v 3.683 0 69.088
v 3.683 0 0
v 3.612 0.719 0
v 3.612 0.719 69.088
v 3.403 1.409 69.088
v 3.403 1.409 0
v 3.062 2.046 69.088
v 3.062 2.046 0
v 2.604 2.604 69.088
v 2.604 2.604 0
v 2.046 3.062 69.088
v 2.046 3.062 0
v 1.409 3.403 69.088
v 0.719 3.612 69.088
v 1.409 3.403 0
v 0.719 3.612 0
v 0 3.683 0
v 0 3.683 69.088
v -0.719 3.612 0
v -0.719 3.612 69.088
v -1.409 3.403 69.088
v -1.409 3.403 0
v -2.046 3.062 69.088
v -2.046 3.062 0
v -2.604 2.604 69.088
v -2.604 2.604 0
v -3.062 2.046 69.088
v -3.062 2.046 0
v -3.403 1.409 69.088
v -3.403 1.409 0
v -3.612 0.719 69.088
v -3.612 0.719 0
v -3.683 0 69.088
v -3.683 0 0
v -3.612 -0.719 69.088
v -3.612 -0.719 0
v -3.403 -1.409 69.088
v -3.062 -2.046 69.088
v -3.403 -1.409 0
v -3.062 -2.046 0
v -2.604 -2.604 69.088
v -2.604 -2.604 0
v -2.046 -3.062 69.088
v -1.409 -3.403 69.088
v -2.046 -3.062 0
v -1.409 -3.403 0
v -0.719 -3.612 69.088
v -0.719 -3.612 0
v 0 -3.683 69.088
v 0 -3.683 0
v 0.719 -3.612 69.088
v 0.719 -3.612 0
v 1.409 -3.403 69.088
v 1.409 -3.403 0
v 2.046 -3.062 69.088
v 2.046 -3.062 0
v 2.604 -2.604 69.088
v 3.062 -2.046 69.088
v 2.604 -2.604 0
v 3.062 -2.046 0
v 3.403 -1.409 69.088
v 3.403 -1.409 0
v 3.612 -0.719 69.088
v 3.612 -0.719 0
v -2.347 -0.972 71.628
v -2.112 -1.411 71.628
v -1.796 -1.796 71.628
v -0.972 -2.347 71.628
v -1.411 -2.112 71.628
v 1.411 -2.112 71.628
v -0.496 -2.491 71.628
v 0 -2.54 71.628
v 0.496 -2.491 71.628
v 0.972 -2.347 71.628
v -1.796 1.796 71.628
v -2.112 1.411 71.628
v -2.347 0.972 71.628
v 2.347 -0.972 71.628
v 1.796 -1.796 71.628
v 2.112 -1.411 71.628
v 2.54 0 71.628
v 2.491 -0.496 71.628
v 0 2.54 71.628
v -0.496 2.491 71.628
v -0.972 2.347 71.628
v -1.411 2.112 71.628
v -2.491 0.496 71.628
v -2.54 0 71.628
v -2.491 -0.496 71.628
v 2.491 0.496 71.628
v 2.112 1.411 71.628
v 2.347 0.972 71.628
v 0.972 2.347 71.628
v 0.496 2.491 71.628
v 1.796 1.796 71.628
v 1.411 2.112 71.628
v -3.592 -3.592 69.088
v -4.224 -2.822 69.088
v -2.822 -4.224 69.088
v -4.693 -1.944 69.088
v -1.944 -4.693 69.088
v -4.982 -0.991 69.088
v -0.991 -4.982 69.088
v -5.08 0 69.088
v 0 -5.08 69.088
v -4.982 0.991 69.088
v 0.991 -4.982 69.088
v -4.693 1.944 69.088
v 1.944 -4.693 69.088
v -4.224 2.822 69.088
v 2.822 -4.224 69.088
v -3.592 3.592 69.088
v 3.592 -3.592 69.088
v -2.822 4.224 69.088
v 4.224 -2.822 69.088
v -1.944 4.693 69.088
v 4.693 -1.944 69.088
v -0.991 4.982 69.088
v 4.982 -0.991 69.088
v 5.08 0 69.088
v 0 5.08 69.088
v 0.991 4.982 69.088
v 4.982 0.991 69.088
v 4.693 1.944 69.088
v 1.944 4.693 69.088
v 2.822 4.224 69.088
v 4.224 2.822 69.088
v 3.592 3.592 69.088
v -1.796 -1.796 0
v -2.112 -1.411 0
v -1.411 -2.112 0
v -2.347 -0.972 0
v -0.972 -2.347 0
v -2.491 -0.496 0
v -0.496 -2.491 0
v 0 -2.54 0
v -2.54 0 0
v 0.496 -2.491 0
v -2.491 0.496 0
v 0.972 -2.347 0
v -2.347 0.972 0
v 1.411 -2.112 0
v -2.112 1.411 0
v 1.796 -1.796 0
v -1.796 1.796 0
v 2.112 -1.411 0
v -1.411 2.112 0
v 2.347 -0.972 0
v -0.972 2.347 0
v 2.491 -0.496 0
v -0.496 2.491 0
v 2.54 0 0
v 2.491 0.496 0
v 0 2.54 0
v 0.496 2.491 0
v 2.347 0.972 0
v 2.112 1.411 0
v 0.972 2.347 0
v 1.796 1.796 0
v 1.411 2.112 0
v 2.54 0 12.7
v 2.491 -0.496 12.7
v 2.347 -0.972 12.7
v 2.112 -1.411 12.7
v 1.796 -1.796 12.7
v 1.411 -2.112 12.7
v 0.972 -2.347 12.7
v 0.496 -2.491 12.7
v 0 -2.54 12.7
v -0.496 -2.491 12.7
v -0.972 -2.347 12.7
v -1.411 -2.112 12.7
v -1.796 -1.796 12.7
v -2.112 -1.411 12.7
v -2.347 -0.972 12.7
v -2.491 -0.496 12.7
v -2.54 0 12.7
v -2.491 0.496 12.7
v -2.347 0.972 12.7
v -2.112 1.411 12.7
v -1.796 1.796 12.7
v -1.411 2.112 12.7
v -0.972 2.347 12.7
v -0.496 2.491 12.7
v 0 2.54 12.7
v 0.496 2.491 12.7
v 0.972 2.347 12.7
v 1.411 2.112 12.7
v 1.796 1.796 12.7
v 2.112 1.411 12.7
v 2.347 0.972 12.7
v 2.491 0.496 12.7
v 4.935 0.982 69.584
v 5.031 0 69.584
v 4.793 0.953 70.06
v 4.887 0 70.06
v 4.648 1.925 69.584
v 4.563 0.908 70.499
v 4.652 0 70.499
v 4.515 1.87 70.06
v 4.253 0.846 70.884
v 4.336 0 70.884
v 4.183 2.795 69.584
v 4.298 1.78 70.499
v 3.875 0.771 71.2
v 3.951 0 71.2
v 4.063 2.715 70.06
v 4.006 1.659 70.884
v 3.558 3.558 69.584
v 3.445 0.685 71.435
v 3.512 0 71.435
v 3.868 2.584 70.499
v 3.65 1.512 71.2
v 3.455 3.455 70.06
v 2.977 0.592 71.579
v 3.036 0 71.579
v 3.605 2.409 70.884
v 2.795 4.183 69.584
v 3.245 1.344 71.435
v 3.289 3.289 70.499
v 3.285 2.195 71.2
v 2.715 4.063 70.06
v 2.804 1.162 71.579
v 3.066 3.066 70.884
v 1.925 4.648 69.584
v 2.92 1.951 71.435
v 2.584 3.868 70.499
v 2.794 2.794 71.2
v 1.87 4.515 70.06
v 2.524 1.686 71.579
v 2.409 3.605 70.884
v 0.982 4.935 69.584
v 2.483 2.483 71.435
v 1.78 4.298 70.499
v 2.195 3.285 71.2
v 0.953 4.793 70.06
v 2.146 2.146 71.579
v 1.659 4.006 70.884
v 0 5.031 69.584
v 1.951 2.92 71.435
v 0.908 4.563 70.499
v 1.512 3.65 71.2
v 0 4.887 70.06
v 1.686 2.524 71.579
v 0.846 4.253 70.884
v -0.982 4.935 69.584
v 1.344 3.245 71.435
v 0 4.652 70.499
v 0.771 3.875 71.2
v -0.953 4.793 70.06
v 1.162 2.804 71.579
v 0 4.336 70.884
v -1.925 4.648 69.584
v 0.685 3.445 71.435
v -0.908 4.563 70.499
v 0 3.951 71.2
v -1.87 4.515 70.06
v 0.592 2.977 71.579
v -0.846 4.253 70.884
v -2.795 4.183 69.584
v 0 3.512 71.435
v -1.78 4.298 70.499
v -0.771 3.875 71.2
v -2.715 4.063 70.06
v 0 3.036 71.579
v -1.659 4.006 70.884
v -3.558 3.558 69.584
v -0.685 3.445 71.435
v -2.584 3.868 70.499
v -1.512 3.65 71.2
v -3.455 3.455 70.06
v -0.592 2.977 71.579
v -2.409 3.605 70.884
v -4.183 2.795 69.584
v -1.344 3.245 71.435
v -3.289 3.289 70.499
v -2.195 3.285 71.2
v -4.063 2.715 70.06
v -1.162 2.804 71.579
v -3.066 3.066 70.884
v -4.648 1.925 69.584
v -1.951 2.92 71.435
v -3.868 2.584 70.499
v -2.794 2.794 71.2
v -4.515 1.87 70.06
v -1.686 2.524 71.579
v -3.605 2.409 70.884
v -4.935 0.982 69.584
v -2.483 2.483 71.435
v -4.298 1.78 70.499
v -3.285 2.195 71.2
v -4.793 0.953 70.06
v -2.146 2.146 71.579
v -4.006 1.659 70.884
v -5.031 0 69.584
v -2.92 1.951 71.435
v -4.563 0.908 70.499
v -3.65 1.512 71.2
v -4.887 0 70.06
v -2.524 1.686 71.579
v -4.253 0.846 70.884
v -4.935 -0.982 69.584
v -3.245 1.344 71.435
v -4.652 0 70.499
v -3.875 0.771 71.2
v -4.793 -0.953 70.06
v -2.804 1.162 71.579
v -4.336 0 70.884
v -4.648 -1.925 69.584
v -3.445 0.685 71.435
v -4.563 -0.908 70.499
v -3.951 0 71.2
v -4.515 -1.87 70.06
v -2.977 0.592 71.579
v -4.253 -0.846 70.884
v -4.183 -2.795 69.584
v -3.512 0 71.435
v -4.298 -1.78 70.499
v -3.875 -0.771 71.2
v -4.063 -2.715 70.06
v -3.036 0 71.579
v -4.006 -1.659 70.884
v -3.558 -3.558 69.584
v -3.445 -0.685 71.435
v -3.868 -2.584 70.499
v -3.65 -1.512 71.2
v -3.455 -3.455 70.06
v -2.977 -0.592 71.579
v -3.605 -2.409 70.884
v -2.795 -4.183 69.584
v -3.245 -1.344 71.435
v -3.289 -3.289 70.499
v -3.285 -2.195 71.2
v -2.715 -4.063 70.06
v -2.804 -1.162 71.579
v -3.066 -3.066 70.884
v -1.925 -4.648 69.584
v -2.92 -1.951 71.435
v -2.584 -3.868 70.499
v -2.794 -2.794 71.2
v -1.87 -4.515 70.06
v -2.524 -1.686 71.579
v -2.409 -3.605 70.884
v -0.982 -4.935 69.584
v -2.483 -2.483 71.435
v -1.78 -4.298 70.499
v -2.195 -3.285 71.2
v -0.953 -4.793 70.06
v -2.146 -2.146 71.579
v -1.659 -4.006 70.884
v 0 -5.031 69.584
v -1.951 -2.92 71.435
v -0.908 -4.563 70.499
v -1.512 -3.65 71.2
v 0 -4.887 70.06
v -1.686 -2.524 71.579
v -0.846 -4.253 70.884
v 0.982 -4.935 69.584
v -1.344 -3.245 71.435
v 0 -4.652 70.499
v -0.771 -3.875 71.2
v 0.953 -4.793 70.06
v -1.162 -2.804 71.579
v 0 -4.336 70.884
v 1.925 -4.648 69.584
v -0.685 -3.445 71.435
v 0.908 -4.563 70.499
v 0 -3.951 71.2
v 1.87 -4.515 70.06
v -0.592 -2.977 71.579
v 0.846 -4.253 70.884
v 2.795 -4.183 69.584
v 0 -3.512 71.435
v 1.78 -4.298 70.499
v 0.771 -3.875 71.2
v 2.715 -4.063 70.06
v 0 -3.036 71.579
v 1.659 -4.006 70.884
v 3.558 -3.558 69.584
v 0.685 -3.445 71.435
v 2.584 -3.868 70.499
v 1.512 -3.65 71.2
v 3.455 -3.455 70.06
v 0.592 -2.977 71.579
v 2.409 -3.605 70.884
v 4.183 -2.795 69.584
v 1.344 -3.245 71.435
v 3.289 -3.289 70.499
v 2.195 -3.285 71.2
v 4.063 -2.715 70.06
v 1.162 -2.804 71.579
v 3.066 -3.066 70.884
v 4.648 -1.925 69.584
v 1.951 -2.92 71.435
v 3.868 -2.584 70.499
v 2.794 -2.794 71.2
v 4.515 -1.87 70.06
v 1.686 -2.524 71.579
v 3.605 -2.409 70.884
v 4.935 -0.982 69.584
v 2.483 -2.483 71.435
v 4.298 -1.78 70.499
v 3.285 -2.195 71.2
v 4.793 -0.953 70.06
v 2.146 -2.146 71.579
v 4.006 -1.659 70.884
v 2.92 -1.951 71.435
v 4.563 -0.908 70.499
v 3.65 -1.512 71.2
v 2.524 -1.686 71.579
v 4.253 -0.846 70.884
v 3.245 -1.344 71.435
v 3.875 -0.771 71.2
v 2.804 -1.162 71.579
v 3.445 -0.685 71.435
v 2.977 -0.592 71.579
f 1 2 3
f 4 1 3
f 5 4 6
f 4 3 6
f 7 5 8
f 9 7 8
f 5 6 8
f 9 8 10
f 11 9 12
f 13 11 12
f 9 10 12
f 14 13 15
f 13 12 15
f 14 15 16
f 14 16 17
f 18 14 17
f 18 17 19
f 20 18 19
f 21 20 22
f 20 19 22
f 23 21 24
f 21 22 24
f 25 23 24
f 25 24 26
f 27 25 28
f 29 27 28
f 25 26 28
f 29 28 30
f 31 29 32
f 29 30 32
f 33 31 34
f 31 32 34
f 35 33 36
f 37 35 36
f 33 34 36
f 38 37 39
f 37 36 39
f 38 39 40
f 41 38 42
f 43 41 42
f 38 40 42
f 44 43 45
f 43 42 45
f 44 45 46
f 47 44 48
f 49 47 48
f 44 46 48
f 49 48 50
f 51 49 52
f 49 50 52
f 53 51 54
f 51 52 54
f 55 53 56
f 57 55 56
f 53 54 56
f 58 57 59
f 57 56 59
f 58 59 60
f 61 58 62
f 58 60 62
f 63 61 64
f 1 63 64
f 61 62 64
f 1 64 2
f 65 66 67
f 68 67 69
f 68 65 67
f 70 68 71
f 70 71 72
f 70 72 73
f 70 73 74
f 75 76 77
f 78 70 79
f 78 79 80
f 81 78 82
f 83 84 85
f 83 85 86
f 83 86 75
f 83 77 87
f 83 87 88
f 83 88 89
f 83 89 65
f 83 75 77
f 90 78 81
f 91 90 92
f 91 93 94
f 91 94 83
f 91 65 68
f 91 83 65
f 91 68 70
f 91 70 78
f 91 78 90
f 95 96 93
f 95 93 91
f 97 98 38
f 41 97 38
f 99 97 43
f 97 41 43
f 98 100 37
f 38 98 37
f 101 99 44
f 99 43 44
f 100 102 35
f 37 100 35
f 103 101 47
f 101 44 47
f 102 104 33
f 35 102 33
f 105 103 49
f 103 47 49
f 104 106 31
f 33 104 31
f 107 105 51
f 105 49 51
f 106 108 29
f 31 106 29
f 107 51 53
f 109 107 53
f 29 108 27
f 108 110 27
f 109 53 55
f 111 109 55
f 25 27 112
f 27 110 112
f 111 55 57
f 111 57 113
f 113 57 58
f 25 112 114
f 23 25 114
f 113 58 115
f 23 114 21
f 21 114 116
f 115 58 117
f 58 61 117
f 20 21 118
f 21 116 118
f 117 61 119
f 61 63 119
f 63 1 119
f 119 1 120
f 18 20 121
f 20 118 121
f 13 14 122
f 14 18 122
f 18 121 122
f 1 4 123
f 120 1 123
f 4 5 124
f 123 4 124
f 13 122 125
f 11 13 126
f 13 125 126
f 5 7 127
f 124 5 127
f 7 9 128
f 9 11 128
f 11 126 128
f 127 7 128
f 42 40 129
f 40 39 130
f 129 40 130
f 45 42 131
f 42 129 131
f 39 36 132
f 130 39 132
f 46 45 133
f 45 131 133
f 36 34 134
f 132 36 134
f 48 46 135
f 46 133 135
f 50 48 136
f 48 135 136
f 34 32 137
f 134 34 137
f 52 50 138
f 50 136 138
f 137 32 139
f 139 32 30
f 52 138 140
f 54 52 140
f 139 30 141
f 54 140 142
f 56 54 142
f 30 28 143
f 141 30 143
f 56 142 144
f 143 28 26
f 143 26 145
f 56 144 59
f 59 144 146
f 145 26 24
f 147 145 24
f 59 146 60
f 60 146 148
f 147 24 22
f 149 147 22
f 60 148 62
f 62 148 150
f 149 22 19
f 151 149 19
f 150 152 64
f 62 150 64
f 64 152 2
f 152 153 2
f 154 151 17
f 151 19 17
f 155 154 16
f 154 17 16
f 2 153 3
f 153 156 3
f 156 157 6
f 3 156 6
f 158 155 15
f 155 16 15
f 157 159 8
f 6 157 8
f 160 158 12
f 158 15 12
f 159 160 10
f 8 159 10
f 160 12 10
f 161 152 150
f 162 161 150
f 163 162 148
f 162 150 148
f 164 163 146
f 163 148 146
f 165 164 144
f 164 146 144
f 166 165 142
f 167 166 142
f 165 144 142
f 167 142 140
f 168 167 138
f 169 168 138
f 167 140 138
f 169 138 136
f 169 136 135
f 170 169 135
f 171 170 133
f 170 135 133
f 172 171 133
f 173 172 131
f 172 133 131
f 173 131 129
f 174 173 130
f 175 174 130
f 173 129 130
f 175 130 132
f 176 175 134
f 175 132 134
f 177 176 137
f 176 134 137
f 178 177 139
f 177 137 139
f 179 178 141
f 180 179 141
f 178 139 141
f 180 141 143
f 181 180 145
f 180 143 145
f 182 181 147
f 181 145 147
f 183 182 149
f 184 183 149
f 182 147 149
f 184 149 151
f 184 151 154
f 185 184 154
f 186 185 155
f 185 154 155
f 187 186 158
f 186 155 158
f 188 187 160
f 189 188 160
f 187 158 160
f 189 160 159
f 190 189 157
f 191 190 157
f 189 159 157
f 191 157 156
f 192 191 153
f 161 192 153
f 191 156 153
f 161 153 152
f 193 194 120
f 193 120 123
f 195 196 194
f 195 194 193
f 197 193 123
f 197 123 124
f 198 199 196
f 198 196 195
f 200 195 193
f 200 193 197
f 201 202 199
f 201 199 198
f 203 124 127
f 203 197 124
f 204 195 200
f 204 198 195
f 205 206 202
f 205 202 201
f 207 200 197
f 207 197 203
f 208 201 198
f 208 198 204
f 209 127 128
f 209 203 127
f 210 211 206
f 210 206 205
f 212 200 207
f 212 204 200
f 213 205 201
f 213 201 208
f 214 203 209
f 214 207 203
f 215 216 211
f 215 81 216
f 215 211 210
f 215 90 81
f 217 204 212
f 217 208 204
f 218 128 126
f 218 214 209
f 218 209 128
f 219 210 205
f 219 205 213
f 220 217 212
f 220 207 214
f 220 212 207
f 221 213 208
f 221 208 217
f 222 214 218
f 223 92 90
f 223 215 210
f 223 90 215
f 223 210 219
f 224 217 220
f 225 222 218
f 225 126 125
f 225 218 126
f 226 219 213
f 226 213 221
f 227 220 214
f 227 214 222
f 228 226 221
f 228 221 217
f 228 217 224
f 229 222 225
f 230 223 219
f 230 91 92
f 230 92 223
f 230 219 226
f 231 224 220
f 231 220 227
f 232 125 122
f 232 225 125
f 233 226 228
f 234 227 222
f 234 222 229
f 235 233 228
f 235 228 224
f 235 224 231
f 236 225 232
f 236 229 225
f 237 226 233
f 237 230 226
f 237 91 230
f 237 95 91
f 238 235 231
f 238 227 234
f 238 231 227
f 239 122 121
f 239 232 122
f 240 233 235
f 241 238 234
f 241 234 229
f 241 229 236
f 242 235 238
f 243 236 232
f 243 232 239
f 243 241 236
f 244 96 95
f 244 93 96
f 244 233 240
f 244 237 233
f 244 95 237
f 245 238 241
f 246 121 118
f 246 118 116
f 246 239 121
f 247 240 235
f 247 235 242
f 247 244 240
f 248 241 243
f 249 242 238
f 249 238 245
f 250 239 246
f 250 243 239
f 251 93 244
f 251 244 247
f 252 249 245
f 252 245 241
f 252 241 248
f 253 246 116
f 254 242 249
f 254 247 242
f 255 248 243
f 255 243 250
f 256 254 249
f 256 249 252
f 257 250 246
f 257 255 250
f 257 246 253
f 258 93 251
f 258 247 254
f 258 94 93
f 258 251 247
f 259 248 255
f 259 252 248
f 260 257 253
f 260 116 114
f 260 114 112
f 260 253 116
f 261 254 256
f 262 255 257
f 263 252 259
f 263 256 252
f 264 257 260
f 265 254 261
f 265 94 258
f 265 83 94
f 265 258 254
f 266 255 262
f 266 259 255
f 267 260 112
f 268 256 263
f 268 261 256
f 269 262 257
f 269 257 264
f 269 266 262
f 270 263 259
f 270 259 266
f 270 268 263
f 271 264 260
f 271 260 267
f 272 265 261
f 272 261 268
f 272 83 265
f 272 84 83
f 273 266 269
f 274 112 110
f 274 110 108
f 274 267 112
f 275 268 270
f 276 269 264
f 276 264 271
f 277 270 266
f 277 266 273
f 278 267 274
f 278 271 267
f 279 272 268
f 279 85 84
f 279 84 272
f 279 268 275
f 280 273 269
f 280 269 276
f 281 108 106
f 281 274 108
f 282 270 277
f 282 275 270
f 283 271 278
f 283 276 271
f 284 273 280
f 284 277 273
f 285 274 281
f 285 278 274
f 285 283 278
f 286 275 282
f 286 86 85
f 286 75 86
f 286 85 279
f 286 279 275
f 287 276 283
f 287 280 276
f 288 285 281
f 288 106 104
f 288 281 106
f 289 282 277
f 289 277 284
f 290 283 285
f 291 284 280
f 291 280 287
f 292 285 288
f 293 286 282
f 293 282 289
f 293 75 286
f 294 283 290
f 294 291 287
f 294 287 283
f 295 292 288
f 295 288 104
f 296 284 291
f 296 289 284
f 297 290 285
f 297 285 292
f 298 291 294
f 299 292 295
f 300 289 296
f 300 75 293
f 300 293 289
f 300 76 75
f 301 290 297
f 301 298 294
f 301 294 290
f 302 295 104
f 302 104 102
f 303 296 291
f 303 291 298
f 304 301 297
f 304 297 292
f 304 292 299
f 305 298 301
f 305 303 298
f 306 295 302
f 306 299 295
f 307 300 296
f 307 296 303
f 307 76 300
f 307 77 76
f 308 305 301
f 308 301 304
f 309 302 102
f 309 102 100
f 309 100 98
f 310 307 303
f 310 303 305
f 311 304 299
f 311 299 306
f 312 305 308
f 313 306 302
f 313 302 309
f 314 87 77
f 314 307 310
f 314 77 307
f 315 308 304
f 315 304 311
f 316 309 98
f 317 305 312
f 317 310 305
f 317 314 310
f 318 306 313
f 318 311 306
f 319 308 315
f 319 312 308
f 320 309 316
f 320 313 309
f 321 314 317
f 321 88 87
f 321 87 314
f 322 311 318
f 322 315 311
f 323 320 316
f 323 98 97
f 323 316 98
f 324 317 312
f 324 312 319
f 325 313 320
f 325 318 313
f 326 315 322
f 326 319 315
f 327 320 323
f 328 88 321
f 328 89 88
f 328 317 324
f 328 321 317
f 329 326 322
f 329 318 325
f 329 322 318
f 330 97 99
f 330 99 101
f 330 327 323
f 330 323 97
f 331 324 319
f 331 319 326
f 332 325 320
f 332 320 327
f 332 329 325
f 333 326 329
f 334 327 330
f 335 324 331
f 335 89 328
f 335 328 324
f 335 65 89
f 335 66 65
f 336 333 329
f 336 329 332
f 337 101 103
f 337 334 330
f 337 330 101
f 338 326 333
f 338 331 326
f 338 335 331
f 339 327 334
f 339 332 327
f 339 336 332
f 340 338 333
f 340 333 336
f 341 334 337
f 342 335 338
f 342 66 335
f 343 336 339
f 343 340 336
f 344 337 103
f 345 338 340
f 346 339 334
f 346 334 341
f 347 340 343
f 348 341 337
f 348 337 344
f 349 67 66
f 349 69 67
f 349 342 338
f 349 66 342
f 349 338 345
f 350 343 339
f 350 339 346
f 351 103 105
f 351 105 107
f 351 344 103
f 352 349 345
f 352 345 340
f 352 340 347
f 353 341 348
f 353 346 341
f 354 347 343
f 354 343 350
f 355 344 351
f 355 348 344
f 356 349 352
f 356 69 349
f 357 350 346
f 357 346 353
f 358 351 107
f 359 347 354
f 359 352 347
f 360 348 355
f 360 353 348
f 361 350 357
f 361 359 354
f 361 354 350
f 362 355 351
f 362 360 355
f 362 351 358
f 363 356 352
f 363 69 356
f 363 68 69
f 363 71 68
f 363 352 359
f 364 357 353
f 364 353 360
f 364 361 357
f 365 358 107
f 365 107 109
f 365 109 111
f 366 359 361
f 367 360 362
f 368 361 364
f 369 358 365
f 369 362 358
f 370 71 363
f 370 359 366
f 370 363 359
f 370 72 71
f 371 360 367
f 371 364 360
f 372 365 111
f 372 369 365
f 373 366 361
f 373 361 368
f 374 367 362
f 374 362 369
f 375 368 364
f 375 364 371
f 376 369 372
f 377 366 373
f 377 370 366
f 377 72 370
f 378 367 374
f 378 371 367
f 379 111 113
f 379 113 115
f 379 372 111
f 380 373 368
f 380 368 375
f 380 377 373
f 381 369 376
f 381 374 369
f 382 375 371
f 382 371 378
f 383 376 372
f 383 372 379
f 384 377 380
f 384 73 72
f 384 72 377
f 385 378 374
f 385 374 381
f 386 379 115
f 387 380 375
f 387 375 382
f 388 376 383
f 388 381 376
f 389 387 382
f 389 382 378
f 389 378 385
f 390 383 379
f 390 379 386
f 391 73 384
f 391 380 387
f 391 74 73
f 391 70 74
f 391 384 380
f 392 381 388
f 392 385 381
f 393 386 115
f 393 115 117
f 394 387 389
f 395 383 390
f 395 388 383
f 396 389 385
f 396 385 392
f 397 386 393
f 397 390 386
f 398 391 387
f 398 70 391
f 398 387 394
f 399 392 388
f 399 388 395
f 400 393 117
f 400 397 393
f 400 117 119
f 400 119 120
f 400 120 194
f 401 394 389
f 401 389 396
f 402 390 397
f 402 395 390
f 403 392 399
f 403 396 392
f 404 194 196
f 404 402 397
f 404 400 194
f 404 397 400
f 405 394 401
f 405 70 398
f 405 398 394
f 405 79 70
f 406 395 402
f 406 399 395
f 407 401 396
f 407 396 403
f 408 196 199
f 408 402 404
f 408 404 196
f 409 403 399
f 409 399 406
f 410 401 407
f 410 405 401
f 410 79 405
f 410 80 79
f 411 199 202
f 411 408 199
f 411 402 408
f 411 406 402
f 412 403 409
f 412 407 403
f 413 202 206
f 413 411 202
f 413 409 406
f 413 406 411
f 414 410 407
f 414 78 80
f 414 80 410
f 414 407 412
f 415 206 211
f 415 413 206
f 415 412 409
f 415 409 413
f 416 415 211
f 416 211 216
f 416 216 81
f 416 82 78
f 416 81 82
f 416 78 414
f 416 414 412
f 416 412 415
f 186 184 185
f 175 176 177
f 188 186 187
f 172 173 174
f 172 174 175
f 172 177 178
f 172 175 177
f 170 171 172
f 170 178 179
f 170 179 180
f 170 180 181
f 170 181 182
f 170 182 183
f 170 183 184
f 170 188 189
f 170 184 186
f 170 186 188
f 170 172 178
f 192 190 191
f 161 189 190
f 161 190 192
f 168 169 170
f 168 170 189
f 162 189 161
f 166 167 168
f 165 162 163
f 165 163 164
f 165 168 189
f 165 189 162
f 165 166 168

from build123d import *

# Parameters (mm, degrees)
F0_R     = 3.683
F1_DEPTH = 69.088
F2_R     = 5.08
F3_DEPTH = 2.54
F4_R     = 2.53999
F5_R     = 2.54
F6_DEPTH = 12.7


# Not quite as in the source:
# - a fillet or chamfer is up to 0.001 mm smaller than in the source, because OpenCascade refuses the exact size


with BuildPart() as f1:
    # F0 (on Top) → F1 (new body)
    with BuildSketch(Plane.XY):
        Circle(F0_R)
    extrude(amount=F1_DEPTH)

    # F2 (on face) → F3 (join)
    with BuildSketch(Plane.XY.offset(69.088)):
        Circle(F2_R)
    extrude(amount=F3_DEPTH)

    # F4 (radius 2.54 in the source; OpenCascade refuses exactly that, so slightly less here)
    f4_edges = [f1.edges().sort_by_distance(p)[0] for p in [
        (-5.08, 0, 71.628),
    ]]
    fillet(f4_edges, radius=F4_R)

    # F5 (on face) → F6 (cut)
    with BuildSketch(Plane(origin=(0, 0, 0), x_dir=(1, 0, 0), z_dir=(0, 0, -1))):
        Circle(F5_R)
    extrude(amount=-F6_DEPTH, mode=Mode.SUBTRACT)


solid = f1.part
